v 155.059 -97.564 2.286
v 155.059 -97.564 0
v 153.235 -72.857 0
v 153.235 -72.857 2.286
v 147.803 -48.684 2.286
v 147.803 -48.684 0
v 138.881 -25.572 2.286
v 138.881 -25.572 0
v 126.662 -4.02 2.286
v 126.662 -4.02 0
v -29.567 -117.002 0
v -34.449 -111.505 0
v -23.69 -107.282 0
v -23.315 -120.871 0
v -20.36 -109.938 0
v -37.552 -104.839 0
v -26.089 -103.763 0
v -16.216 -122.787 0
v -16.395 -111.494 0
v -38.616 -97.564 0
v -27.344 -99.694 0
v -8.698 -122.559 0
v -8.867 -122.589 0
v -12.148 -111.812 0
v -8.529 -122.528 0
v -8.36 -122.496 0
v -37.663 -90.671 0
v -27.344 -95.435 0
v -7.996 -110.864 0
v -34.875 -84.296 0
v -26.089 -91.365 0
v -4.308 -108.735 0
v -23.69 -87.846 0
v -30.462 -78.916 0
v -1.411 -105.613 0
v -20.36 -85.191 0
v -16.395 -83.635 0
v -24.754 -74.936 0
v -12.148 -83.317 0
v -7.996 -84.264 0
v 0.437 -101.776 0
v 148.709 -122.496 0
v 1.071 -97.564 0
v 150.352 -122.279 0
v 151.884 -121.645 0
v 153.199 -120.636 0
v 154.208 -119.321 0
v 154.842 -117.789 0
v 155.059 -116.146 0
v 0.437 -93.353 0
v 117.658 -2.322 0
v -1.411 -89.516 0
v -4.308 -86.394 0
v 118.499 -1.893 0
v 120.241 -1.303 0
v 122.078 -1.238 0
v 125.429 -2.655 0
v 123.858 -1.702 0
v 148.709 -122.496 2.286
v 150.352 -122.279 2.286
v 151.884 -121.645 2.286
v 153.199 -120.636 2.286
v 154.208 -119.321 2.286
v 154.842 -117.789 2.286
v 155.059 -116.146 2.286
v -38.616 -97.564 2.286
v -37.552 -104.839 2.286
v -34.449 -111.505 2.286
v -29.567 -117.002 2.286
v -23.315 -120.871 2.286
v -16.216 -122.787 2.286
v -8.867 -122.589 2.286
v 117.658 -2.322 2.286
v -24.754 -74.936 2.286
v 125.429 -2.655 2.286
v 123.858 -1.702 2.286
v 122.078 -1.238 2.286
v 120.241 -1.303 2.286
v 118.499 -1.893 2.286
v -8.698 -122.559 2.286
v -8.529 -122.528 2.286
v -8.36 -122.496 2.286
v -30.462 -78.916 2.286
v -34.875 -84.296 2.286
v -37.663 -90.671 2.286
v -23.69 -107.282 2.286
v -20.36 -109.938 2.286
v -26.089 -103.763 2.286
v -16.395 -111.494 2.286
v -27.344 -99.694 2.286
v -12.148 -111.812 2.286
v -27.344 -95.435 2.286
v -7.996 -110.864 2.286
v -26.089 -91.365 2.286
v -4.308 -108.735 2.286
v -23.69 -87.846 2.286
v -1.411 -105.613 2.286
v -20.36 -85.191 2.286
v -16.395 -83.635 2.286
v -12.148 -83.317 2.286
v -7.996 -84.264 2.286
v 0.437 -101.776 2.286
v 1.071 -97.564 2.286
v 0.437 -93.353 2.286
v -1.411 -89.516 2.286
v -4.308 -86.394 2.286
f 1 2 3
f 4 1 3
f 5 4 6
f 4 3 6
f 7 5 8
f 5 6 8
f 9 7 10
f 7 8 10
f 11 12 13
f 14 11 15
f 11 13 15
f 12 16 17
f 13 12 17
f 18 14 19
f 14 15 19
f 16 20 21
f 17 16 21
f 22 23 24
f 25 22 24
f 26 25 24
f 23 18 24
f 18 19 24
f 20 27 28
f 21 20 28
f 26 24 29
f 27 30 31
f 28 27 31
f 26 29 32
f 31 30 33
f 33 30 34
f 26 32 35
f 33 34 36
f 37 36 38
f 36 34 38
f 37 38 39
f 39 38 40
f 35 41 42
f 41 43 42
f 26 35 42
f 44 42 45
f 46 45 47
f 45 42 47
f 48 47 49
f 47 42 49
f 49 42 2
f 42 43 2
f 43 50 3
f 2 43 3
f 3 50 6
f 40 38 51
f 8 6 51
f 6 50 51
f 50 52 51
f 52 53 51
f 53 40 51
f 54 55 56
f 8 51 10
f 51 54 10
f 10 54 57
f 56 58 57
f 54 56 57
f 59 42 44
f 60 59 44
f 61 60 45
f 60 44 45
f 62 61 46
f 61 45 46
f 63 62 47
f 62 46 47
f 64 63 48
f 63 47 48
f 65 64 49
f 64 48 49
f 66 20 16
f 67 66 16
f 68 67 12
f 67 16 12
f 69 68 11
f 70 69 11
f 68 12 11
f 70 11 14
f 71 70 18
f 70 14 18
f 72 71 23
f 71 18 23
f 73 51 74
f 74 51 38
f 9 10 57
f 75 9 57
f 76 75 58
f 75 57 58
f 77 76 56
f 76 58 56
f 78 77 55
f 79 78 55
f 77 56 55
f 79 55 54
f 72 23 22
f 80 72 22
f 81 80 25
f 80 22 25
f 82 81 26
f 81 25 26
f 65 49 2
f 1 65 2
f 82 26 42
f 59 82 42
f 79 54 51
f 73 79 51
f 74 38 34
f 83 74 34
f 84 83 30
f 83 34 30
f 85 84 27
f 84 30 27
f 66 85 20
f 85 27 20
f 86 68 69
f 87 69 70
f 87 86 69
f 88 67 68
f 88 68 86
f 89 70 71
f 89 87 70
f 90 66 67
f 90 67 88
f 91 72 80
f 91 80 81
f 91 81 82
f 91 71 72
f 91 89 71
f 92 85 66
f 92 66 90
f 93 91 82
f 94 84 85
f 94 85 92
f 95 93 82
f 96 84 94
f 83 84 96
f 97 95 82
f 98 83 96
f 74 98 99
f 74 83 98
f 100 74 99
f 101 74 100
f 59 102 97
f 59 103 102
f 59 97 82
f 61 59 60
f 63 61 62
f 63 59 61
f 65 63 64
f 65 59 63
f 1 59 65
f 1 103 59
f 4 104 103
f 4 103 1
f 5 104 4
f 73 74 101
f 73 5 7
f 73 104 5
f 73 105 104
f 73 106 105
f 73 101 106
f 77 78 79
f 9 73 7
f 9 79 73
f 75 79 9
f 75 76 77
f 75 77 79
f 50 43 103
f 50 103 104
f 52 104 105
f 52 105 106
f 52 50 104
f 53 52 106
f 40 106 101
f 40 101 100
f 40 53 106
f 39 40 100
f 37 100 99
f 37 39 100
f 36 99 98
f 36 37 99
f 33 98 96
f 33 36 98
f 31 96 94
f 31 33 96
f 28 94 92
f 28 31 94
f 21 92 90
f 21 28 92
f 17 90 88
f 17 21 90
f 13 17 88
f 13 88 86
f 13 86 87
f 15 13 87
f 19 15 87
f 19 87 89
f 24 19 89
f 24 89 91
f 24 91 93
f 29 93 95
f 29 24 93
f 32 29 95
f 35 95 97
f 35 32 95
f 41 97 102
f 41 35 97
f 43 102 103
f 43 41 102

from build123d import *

# Parameters (mm, degrees)
F0_R     = 14.2875
F1_DEPTH = 2.286


with BuildPart() as f1:
    # F0 (on Top) → F1 (new body)
    with BuildSketch(Plane.XY):
        with BuildLine():
            ThreePointArc((-8.360123, -122.495806), (6.386198, -113.716984), (12.183869, -97.564316))
            ThreePointArc((12.183869, -97.564316), (0.052198, -75.905335), (-24.754041, -74.936089))
            ThreePointArc((-24.754041, -74.936089), (-34.875112, -84.295987), (-38.616131, -97.564316))
            Line((-38.616131, -97.564316), (-38.594074, -96.545842))
            ThreePointArc((-38.594074, -96.545842), (-31.353941, -114.860812), (-13.200028, -122.495806))
            Line((-13.200028, -122.495806), (-13.176682, -122.495806))
            Line((-13.176682, -122.495806), (-8.360123, -122.495806))
        make_face()
        with Locations((-13.216131, -97.564316)):
            Circle(F0_R, mode=Mode.SUBTRACT)
        with BuildLine():
            ThreePointArc((-24.754041, -74.936089), (0.052198, -75.905335), (12.183869, -97.564316))
            ThreePointArc((12.183869, -97.564316), (6.386198, -113.716984), (-8.360123, -122.495806))
            Line((-8.360123, -122.495806), (148.645369, -122.495806))
            Line((148.645369, -122.495806), (148.645369, -97.564316))
            ThreePointArc((148.645369, -97.564316), (140.703649, -47.485912), (117.657808, -2.321693))
            Line((117.657808, -2.321693), (-24.754041, -74.936089))
        make_face()
        with BuildLine():
            ThreePointArc((-8.866676, -122.589148), (-8.613163, -122.543761), (-8.360123, -122.495806))
            Line((-8.360123, -122.495806), (-13.176682, -122.495806))
            Line((-13.176682, -122.495806), (-8.866676, -122.589148))
        make_face()
        with BuildLine():
            Line((-38.594074, -96.545842), (-38.616131, -97.564316))
            ThreePointArc((-38.616131, -97.564316), (-29.566725, -117.001859), (-8.866676, -122.589148))
            Line((-8.866676, -122.589148), (-13.176682, -122.495806))
            Line((-13.176682, -122.495806), (-13.200028, -122.495806))
            ThreePointArc((-13.200028, -122.495806), (-31.353941, -114.860812), (-38.594074, -96.545842))
        make_face()
        with BuildLine():
            Line((118.499122, -1.892715), (117.657808, -2.321693))
            ThreePointArc((117.657808, -2.321693), (140.703649, -47.485912), (148.645369, -97.564316))
            Line((148.645369, -97.564316), (148.645369, -122.495806))
            Line((148.645369, -122.495806), (148.708869, -122.495806))
            ThreePointArc((148.708869, -122.495806), (153.198997, -120.635934), (155.058869, -116.145806))
            Line((155.058869, -116.145806), (155.058869, -97.564316))
            ThreePointArc((155.058869, -97.564316), (147.803234, -48.684465), (126.662021, -4.01979))
            ThreePointArc((126.662021, -4.01979), (122.984803, -1.404965), (118.499122, -1.892715))
        make_face()
    extrude(amount=F1_DEPTH)


solid = f1.part
